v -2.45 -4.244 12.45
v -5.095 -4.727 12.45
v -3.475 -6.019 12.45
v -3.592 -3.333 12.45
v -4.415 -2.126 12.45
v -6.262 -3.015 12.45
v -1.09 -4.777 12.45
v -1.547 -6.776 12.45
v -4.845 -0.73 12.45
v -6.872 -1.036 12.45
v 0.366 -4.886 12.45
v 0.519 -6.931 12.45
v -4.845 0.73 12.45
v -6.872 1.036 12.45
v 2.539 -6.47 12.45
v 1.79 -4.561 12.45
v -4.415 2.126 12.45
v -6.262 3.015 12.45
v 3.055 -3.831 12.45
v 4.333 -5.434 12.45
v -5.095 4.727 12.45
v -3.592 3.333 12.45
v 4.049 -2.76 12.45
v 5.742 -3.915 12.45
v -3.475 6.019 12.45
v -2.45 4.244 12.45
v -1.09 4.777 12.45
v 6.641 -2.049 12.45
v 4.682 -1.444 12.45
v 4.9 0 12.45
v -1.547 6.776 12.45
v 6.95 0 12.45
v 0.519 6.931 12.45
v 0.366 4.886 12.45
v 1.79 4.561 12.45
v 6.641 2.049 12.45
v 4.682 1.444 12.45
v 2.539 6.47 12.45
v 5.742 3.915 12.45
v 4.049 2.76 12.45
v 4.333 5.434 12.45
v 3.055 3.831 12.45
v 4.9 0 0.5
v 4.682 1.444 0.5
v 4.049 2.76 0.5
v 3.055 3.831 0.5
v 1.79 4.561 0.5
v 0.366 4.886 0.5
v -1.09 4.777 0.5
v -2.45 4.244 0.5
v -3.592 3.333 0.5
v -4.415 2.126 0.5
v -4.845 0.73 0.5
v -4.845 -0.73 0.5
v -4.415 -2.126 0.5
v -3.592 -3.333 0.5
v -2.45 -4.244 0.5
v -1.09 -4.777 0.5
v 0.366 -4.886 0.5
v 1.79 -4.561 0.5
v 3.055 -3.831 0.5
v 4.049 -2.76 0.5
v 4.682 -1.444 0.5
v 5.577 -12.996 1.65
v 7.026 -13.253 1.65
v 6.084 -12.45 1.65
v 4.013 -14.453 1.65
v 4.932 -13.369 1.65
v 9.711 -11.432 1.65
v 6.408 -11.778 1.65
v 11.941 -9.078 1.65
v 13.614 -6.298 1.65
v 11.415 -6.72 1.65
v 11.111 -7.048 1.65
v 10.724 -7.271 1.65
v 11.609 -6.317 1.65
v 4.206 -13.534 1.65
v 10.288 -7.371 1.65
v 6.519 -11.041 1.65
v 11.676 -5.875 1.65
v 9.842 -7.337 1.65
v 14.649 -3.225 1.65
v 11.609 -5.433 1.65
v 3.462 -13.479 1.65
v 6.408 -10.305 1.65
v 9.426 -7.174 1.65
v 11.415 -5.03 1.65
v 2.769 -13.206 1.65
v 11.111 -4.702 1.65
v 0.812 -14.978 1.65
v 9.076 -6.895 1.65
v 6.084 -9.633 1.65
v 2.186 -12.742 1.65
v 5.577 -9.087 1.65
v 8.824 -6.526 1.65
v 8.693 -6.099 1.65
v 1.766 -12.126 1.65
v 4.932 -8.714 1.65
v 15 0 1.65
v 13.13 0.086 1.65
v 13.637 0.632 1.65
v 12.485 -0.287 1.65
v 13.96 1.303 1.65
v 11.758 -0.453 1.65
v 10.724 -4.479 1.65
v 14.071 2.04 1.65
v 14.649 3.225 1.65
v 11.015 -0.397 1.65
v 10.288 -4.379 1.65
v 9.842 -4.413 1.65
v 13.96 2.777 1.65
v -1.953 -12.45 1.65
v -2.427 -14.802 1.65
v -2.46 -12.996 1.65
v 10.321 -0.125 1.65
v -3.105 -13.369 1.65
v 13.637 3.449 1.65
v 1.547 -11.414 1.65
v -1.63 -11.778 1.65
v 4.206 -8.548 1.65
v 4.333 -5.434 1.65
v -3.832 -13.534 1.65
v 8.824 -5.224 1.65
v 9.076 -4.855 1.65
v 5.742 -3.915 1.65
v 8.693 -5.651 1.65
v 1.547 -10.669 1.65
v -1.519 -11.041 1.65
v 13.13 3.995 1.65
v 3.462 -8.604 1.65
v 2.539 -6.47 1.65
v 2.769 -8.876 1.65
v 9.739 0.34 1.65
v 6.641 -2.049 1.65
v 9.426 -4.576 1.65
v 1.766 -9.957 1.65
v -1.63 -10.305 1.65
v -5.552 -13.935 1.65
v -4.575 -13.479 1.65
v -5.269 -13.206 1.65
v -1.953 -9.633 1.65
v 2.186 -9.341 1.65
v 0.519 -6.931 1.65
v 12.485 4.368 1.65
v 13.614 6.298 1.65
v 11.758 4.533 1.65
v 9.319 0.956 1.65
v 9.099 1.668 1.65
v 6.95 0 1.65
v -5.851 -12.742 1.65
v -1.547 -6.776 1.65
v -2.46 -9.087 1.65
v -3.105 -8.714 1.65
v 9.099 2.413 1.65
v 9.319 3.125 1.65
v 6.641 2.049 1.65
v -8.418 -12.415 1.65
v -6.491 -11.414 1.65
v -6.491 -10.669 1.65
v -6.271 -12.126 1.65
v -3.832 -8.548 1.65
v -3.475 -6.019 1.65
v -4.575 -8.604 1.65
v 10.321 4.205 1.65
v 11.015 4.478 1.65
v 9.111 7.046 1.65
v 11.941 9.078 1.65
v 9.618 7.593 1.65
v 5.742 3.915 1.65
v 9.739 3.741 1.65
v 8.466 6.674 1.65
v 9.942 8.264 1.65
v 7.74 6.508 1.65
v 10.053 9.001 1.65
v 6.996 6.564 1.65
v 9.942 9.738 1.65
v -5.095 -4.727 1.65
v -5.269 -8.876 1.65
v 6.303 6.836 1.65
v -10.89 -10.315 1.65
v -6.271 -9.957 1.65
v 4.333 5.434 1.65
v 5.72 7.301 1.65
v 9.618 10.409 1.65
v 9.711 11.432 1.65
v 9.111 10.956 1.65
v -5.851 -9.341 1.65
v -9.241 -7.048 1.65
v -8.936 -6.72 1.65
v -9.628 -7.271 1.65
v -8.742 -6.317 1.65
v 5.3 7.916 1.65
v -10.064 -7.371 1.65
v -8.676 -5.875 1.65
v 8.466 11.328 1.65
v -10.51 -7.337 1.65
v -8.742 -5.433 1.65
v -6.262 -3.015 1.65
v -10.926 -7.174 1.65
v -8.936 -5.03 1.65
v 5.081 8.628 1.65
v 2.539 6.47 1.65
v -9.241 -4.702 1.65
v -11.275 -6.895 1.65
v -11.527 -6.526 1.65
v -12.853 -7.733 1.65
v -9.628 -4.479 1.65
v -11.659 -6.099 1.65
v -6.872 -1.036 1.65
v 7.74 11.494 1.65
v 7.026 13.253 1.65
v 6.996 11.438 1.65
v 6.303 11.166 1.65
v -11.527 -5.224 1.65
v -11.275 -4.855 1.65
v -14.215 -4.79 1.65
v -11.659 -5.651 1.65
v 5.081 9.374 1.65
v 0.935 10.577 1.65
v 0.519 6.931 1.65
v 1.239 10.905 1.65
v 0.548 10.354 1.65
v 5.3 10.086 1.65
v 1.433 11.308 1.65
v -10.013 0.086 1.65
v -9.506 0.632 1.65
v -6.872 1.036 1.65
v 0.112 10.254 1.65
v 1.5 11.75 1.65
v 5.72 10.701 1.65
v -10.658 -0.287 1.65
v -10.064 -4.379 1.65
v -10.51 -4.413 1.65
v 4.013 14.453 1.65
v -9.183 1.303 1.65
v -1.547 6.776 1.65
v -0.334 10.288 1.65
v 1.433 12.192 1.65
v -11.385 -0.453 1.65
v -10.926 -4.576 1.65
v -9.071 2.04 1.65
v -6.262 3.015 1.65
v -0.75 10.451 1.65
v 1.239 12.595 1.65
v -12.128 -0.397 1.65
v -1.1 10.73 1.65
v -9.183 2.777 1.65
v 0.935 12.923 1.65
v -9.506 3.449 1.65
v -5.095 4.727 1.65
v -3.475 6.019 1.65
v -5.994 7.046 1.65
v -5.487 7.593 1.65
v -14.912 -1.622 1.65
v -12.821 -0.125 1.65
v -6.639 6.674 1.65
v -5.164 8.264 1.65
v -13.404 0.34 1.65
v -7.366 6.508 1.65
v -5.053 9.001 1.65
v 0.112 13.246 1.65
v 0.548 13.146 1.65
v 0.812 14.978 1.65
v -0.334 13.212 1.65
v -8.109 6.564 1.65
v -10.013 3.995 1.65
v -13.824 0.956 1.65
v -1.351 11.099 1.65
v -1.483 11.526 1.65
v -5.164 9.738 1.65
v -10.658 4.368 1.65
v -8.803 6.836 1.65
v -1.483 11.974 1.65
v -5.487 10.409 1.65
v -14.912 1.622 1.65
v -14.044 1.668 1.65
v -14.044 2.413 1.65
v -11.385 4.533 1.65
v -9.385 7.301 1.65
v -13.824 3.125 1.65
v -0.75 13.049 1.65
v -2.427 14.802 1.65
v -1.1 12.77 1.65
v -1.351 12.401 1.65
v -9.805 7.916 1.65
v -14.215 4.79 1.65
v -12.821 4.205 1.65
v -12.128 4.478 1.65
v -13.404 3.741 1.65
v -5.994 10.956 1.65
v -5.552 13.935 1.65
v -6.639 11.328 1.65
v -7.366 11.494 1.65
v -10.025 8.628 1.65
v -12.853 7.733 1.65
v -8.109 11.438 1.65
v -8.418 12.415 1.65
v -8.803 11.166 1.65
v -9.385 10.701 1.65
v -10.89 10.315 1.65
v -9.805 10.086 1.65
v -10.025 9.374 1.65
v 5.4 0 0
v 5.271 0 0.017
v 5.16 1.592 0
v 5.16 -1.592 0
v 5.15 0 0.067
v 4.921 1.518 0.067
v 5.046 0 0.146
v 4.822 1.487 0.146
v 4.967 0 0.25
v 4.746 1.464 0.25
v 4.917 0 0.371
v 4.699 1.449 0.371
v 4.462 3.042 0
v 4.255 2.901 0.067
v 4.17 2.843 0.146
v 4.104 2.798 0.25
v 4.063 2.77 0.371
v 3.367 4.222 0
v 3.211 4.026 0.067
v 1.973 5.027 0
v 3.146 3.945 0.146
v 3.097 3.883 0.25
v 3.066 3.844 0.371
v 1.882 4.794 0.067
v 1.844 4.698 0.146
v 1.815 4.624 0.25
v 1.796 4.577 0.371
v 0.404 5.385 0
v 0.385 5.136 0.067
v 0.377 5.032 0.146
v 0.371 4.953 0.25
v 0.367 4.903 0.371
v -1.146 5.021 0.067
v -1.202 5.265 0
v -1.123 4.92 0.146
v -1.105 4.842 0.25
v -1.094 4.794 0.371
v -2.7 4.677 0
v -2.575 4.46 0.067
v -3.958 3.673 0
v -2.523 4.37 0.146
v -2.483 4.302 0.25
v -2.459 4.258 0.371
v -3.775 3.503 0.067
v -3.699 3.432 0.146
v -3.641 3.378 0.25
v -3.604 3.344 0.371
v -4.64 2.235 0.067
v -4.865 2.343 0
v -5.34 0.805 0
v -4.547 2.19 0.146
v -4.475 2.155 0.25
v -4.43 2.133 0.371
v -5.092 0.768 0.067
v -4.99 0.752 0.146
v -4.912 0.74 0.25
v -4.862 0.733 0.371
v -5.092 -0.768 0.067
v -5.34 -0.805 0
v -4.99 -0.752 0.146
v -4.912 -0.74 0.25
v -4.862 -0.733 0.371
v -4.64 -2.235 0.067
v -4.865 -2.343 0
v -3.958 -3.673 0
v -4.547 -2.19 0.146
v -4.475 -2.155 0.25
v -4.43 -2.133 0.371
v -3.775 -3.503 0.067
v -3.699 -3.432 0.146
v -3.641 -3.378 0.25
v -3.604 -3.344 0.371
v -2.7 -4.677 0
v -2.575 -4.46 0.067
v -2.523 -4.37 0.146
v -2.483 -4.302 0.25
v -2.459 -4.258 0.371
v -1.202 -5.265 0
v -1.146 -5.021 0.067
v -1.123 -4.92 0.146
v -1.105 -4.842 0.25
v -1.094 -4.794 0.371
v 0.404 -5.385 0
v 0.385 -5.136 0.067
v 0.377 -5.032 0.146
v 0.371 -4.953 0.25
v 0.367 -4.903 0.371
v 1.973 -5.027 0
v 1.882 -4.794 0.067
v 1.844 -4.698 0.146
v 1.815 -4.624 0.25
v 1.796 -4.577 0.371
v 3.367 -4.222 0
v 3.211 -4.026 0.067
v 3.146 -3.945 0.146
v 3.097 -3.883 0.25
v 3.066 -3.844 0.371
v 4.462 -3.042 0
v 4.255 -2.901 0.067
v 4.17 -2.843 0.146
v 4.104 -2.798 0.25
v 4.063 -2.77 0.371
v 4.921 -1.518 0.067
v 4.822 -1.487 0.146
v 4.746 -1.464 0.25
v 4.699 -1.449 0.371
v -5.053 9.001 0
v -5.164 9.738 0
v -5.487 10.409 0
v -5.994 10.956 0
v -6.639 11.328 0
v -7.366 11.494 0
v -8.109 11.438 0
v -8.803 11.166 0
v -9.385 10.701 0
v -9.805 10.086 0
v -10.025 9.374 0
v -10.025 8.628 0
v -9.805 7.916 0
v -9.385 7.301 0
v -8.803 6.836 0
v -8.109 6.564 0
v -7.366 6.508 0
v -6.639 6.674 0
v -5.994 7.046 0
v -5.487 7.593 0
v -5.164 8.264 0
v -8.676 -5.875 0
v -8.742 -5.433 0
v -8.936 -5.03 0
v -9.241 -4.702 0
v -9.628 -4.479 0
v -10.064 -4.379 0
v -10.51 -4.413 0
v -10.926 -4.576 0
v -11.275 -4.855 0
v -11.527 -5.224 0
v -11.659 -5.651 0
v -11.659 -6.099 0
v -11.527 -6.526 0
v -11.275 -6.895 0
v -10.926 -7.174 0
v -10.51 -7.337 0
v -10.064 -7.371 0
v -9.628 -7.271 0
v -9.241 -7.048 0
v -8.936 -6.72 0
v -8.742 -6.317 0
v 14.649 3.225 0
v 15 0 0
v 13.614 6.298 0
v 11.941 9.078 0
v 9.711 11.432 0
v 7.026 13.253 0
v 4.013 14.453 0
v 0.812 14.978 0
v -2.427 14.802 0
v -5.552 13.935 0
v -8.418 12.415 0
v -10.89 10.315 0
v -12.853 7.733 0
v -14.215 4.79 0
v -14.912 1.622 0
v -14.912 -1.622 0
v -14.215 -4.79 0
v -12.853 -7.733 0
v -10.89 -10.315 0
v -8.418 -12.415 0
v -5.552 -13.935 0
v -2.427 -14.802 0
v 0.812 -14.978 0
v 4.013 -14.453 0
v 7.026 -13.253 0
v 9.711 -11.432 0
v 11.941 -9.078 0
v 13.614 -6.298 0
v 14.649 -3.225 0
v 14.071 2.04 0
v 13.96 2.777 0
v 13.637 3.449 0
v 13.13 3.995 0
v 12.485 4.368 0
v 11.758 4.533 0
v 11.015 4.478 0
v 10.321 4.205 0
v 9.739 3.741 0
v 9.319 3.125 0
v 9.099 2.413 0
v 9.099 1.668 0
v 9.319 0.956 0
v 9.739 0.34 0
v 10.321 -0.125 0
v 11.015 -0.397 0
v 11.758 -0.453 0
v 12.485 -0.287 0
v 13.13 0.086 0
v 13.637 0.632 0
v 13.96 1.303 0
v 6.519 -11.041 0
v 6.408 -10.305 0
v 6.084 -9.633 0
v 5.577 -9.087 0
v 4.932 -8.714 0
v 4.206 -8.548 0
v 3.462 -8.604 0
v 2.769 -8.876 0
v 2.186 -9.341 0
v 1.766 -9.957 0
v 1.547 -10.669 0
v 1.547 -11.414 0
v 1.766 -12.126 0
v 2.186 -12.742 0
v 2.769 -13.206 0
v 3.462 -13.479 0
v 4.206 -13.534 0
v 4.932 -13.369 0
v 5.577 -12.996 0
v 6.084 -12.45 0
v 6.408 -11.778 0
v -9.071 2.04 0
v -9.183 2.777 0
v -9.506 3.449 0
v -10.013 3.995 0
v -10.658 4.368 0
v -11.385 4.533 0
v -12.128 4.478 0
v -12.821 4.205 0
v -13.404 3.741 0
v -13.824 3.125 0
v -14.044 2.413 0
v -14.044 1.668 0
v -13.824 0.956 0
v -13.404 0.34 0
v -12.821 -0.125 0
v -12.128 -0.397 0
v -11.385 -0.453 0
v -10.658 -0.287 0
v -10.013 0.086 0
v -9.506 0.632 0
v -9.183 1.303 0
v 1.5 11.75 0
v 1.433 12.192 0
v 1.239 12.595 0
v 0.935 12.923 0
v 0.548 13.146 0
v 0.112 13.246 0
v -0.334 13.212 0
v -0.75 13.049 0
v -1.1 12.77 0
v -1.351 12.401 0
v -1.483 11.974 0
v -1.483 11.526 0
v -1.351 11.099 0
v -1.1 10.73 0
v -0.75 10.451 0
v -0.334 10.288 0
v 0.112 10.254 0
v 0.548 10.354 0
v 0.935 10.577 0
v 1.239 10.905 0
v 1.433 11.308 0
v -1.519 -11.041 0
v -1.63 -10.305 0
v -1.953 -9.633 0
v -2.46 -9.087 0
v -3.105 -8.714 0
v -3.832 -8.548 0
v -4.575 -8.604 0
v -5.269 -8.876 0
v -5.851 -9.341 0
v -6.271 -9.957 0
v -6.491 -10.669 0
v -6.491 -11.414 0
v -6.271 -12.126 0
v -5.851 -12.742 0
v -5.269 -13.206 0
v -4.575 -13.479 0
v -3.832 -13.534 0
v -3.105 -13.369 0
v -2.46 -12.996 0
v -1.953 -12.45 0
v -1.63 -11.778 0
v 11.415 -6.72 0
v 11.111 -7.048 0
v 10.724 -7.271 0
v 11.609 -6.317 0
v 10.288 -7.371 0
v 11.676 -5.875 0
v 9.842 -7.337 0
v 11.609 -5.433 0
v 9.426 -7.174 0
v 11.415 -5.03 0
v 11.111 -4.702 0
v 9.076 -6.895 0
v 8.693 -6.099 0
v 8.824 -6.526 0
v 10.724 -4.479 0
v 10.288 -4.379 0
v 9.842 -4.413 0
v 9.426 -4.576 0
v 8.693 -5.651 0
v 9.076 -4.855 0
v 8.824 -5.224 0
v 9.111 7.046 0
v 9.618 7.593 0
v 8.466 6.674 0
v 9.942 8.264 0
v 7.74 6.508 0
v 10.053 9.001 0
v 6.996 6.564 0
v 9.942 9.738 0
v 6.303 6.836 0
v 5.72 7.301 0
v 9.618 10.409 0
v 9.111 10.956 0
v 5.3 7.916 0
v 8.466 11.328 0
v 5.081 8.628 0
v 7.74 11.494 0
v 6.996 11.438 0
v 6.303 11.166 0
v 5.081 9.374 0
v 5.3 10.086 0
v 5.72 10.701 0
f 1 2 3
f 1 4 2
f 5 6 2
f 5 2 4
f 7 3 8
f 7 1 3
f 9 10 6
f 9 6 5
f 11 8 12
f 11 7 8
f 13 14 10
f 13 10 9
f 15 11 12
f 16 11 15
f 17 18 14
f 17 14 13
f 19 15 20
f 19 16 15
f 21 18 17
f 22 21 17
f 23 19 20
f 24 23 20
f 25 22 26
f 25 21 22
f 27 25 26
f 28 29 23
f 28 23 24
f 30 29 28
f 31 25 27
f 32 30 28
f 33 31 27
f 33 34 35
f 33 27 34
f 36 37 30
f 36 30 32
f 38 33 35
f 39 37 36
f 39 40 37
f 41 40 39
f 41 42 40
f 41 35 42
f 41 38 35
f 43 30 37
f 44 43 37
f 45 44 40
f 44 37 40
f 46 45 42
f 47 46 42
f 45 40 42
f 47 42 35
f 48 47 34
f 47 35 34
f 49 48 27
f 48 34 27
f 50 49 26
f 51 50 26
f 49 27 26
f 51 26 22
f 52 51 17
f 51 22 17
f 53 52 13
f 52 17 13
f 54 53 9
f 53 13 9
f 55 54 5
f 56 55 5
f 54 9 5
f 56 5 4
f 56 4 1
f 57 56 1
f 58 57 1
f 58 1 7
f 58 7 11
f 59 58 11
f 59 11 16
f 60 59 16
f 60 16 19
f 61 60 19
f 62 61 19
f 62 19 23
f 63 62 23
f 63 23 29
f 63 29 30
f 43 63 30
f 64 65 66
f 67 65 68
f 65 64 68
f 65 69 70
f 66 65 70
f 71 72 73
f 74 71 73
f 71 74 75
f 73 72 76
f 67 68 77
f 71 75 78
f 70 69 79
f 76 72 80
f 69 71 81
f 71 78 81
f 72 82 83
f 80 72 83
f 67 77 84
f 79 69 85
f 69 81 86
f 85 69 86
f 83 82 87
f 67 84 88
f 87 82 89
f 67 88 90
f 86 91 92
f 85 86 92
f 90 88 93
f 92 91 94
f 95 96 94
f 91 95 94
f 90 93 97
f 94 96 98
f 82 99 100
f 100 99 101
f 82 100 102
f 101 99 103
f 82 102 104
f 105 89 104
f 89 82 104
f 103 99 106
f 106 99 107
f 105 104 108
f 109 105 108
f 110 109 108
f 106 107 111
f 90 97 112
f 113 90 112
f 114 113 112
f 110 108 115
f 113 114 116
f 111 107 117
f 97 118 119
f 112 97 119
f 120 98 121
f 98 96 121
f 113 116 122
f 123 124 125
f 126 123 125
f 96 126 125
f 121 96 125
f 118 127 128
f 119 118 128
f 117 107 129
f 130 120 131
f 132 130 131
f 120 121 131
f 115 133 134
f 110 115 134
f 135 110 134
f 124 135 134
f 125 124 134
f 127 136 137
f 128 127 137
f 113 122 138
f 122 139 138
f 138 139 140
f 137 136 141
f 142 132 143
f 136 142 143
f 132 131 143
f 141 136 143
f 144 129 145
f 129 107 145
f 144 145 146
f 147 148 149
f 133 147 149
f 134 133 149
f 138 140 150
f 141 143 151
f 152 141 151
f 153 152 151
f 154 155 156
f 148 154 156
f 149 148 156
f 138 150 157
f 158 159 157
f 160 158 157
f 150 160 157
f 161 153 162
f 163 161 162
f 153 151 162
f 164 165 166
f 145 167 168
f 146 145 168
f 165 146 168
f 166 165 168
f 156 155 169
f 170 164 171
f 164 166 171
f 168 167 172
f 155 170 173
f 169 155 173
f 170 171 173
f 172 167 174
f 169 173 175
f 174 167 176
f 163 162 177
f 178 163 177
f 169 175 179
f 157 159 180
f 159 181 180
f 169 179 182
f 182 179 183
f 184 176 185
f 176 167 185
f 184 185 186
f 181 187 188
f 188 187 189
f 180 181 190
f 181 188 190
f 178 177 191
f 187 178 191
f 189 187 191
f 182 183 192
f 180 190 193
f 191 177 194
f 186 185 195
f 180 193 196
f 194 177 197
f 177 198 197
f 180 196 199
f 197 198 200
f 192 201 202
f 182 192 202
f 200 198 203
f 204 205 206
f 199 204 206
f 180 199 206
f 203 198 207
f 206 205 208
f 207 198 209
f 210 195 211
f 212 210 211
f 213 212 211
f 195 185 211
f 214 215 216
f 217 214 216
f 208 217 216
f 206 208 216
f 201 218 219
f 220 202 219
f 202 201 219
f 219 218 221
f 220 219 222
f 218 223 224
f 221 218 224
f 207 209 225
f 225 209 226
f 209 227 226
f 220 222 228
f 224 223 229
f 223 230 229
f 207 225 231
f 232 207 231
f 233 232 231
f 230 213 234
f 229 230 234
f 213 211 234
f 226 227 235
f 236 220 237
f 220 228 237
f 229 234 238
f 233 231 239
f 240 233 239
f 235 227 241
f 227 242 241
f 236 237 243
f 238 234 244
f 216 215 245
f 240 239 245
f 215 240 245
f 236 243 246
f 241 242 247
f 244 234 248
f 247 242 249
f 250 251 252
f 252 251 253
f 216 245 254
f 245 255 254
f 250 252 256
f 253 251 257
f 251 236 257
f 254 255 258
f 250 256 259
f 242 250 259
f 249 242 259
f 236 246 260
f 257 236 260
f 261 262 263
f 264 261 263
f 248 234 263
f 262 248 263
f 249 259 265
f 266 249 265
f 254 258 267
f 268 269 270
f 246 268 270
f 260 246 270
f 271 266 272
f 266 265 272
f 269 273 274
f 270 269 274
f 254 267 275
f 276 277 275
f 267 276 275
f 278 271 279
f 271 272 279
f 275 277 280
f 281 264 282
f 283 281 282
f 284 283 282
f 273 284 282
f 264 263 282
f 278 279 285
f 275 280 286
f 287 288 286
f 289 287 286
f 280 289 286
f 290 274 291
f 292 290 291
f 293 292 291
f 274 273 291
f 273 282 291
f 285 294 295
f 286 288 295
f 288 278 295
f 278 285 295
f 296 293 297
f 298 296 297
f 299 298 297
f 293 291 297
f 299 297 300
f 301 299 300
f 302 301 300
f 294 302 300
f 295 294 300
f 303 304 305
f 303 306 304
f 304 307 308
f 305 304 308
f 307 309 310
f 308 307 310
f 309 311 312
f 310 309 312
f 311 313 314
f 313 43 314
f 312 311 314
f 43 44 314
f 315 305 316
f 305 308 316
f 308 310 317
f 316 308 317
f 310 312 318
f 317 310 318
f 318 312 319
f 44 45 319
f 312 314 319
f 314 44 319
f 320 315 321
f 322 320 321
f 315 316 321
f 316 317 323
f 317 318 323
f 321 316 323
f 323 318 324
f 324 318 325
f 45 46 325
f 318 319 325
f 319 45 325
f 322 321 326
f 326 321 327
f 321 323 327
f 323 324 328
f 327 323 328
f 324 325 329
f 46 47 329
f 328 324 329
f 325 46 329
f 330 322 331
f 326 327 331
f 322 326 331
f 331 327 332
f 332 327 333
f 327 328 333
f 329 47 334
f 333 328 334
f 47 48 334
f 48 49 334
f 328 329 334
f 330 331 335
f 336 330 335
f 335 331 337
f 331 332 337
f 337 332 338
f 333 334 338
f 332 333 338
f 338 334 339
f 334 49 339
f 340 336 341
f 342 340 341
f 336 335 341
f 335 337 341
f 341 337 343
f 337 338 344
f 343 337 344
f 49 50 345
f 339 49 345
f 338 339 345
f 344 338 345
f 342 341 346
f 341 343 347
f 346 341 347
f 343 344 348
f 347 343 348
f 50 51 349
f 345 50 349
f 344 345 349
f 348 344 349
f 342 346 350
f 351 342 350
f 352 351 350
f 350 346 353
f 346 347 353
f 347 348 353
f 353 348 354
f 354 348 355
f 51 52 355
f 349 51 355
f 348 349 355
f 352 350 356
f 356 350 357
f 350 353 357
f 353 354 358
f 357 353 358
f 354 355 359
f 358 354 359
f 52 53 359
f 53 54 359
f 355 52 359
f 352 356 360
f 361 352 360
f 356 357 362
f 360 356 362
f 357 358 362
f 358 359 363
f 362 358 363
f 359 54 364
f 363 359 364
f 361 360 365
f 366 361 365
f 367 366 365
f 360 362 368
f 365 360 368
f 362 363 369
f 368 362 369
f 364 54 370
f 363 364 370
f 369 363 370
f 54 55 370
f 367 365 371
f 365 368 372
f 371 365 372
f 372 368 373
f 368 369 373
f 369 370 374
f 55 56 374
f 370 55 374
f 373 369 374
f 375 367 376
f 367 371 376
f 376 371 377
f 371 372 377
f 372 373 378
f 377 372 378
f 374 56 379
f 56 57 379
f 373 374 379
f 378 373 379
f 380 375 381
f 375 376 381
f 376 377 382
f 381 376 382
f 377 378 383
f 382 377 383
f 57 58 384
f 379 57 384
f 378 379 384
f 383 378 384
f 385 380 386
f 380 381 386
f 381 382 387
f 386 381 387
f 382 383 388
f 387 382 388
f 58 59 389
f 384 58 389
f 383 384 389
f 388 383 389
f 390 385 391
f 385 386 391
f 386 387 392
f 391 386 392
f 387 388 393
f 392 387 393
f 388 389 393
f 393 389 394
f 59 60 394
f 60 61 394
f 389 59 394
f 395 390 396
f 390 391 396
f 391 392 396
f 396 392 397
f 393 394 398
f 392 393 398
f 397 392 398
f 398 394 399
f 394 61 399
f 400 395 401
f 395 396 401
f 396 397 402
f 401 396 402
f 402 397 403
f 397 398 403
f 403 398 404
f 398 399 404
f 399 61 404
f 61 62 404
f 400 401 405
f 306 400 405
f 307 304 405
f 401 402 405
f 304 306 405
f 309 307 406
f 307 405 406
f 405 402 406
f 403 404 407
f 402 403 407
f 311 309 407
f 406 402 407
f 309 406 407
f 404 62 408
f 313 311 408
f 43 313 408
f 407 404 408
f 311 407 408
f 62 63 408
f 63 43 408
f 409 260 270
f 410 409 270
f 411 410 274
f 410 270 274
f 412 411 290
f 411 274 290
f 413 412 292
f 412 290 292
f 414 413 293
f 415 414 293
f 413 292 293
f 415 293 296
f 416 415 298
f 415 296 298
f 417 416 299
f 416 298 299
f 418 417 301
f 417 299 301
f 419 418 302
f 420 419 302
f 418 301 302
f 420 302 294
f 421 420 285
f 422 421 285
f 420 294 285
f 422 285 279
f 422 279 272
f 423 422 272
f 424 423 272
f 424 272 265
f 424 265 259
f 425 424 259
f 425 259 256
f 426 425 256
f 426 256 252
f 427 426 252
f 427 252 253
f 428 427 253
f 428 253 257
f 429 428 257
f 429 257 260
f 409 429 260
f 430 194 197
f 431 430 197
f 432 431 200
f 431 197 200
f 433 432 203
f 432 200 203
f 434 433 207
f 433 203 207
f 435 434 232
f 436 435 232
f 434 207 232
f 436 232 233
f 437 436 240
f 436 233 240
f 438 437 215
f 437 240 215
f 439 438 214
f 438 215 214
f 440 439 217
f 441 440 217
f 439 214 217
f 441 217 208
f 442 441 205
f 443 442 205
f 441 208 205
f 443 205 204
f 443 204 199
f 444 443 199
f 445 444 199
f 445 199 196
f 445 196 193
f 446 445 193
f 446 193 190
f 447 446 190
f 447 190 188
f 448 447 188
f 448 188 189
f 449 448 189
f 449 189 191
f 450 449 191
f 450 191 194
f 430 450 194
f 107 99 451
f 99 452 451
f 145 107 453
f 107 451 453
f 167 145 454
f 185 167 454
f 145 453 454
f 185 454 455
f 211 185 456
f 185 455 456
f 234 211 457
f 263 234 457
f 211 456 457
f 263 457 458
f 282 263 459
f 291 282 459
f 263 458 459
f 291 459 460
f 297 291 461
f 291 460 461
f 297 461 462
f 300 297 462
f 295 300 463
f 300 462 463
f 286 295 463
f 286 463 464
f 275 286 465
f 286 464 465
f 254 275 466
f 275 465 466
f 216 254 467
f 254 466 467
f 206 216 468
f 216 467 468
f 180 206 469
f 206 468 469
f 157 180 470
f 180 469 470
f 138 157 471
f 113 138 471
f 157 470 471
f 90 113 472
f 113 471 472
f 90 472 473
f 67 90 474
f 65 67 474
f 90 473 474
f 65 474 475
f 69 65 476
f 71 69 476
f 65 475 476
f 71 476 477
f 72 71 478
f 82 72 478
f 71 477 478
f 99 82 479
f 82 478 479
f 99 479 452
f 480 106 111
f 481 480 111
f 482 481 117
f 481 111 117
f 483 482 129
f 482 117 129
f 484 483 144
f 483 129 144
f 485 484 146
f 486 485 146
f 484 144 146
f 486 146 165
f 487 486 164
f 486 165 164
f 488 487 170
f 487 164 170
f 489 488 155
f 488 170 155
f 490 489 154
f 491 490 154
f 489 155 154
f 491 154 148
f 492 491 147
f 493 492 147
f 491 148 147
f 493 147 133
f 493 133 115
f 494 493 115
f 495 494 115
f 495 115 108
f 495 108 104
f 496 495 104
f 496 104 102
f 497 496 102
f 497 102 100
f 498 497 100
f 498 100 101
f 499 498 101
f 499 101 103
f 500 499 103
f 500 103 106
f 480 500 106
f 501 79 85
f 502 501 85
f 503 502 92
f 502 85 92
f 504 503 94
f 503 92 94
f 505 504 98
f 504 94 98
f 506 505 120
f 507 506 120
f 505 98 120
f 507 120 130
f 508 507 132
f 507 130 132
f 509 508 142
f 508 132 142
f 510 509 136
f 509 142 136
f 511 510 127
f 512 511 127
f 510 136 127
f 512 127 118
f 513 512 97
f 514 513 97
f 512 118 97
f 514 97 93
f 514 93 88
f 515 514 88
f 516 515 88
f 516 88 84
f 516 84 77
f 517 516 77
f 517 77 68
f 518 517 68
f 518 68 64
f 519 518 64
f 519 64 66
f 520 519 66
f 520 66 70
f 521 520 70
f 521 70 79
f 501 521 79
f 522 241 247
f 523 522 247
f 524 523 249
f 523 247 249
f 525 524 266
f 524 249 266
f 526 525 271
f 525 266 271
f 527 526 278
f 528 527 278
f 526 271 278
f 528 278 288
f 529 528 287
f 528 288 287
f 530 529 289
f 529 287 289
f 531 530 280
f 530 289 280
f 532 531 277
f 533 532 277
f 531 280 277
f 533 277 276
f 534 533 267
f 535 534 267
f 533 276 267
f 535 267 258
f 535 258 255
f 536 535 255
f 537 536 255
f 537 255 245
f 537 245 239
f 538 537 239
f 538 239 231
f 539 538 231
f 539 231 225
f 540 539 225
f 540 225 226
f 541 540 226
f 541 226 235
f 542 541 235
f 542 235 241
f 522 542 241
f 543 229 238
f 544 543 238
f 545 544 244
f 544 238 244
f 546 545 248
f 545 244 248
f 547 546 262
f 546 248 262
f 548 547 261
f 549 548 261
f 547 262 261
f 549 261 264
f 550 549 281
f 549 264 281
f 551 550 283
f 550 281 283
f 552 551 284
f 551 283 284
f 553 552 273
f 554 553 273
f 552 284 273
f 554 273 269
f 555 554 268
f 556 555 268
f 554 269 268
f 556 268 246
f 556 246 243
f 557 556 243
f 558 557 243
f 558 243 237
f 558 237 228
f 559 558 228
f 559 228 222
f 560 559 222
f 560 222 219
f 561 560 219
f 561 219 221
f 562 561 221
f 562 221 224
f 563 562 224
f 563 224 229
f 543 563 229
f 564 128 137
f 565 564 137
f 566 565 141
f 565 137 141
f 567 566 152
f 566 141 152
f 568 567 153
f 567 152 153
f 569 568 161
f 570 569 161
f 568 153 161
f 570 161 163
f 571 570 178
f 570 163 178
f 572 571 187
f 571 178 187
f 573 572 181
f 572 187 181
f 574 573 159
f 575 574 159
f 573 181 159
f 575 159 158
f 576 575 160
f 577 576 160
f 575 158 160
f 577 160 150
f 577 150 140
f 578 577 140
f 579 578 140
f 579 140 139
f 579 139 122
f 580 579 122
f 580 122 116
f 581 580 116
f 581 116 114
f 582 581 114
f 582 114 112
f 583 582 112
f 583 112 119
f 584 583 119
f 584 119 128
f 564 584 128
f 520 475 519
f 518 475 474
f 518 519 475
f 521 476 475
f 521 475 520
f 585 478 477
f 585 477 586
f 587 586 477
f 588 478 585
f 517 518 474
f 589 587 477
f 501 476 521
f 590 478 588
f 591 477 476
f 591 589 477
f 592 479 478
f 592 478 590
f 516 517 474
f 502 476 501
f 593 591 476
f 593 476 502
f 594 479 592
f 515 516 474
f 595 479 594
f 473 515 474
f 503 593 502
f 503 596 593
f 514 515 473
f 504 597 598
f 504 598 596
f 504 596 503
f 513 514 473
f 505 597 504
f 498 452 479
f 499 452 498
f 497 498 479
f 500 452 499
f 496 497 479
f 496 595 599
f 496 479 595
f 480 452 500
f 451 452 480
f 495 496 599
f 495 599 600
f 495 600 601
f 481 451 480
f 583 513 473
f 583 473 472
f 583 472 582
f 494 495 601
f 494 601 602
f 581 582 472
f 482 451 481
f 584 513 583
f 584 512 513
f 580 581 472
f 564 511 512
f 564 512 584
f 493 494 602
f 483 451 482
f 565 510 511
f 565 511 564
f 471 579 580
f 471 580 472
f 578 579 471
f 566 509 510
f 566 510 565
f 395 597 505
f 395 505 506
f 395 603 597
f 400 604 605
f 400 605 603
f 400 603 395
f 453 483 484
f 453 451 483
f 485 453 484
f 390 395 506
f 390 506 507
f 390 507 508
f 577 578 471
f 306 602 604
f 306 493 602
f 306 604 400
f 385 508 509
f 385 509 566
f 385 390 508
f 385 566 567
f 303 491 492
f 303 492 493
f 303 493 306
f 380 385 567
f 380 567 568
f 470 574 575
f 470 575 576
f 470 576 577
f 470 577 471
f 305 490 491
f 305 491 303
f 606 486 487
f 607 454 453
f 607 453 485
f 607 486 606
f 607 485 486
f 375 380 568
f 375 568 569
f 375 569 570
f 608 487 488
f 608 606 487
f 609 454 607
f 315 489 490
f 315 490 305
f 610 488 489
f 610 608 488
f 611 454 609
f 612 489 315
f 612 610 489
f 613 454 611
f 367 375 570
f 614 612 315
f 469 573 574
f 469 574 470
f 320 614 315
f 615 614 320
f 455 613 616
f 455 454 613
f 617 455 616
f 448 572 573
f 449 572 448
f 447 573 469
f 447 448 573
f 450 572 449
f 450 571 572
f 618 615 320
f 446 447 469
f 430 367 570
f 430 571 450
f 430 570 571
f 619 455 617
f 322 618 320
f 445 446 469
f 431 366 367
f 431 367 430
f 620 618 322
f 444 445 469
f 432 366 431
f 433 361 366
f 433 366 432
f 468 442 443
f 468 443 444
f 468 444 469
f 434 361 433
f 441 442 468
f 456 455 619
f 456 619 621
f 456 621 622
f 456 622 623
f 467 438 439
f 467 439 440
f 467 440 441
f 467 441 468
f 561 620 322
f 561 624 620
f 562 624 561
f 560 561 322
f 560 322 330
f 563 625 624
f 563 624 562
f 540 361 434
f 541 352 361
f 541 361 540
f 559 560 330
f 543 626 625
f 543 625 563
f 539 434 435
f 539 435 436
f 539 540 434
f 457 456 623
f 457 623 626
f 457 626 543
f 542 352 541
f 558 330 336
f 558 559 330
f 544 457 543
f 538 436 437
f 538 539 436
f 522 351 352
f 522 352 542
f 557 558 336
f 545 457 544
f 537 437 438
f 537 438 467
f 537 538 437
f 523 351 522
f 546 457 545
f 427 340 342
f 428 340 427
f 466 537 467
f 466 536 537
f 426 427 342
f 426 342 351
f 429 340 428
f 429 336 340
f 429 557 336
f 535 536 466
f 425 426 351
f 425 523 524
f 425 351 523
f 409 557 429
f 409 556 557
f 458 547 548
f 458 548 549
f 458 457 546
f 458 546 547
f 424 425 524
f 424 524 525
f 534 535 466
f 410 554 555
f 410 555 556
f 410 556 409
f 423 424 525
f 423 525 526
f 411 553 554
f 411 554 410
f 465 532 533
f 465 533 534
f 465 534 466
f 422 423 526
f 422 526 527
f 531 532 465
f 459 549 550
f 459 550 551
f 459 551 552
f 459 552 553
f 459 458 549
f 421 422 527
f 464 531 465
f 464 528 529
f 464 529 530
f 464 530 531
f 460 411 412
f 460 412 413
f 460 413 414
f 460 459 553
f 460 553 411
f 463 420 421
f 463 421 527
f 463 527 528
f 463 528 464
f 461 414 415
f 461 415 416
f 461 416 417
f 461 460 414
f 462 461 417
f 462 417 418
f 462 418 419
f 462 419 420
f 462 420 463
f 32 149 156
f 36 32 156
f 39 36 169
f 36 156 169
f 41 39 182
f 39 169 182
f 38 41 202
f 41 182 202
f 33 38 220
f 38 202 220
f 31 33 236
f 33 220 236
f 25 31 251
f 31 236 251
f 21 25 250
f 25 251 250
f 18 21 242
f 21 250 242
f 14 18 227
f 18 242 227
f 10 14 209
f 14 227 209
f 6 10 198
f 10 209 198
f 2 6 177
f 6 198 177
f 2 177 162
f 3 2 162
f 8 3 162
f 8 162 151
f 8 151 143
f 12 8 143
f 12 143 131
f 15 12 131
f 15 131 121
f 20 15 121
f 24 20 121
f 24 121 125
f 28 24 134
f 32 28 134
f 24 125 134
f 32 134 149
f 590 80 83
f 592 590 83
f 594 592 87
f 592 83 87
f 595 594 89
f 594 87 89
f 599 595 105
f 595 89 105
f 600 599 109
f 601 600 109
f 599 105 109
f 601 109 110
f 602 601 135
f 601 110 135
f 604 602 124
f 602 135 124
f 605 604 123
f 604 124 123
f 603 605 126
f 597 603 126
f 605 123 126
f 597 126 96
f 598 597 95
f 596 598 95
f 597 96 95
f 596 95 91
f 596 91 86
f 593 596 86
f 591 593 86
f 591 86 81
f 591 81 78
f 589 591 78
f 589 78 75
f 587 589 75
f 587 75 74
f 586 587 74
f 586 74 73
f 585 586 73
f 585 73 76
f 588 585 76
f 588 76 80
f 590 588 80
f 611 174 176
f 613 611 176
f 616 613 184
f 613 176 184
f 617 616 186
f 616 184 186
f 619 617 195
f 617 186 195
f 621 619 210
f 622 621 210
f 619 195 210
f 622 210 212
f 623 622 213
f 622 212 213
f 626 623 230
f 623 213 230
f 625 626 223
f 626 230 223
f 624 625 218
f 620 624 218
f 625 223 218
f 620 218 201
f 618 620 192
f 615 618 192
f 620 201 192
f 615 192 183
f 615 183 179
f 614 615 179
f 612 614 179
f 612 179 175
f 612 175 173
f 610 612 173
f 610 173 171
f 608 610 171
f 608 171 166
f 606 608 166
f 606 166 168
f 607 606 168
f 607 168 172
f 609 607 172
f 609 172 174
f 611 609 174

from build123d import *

# Parameters (mm, degrees)
SKETCH1_W                      = 15
SKETCH1_H                      = 1.65
SKETCH2_R                      = 6.95
BOSS_EXTRUDE1_DEPTH            = 10.8
F_5_0_5_DIAMETER_HOLE1_D       = 5
F_5_0_5_DIAMETER_HOLE1_DEPTH   = 12.45
F_3_0_3_DIAMETER_HOLE1_D       = 3
F_3_0_3_DIAMETER_HOLE1_DEPTH   = 12.45
F_9_8_9_8_DIAMETER_HOLE1_D     = 9.8
F_9_8_9_8_DIAMETER_HOLE1_DEPTH = 12.45
FILLET1_R                      = 0.5


with BuildPart() as part:
    # Sketch1 → Revolve1 (revolve)
    with BuildSketch(Plane(origin=(0, 0, 0), x_dir=(1, 0, 0), z_dir=(0, 1, 0))):
        with Locations((7.5, -0.825)):
            Rectangle(SKETCH1_W, SKETCH1_H)
    revolve(axis=Axis((0, 0, 0), (0, 0, 1)))

    # Sketch2 → Boss-Extrude1 (add)
    with BuildSketch(Plane.XY.offset(1.65)):
        Circle(SKETCH2_R)
    extrude(amount=BOSS_EXTRUDE1_DEPTH)

    # Ø5.0 (5) Diameter Hole1
    with Locations(Plane(origin=(0, 0, 0), x_dir=(-1, 0, 0), z_dir=(0, 0, -1))):
        with Locations((7.552754414, 9.001022207), (11.571491098, 2.040366088), (4.018736684, -11.041388294), (-4.018736684, -11.041388294), (-11.571491098, 2.040366088), (-7.552754414, 9.001022207)):
            Hole(F_5_0_5_DIAMETER_HOLE1_D / 2, depth=F_5_0_5_DIAMETER_HOLE1_DEPTH)

    # Ø3.0 (3) Diameter Hole1
    with Locations(Plane(origin=(0, 0, 0), x_dir=(-1, 0, 0), z_dir=(0, 0, -1))):
        with Locations((0, 11.75), (10.175798494, -5.875), (-10.175798494, -5.875)):
            Hole(F_3_0_3_DIAMETER_HOLE1_D / 2, depth=F_3_0_3_DIAMETER_HOLE1_DEPTH)

    # Ø9.8 (9.8) Diameter Hole1
    with Locations(Plane(origin=(0, 0, 0), x_dir=(-1, 0, 0), z_dir=(0, 0, -1))):
        with Locations((0, 0)):
            Hole(F_9_8_9_8_DIAMETER_HOLE1_D / 2, depth=F_9_8_9_8_DIAMETER_HOLE1_DEPTH)

    # Fillet1
    fillet1_edges = [part.edges().sort_by_distance(p)[0] for p in [
        (-4.9, 0, 0),
    ]]
    fillet(fillet1_edges, radius=FILLET1_R)


solid = part.part
